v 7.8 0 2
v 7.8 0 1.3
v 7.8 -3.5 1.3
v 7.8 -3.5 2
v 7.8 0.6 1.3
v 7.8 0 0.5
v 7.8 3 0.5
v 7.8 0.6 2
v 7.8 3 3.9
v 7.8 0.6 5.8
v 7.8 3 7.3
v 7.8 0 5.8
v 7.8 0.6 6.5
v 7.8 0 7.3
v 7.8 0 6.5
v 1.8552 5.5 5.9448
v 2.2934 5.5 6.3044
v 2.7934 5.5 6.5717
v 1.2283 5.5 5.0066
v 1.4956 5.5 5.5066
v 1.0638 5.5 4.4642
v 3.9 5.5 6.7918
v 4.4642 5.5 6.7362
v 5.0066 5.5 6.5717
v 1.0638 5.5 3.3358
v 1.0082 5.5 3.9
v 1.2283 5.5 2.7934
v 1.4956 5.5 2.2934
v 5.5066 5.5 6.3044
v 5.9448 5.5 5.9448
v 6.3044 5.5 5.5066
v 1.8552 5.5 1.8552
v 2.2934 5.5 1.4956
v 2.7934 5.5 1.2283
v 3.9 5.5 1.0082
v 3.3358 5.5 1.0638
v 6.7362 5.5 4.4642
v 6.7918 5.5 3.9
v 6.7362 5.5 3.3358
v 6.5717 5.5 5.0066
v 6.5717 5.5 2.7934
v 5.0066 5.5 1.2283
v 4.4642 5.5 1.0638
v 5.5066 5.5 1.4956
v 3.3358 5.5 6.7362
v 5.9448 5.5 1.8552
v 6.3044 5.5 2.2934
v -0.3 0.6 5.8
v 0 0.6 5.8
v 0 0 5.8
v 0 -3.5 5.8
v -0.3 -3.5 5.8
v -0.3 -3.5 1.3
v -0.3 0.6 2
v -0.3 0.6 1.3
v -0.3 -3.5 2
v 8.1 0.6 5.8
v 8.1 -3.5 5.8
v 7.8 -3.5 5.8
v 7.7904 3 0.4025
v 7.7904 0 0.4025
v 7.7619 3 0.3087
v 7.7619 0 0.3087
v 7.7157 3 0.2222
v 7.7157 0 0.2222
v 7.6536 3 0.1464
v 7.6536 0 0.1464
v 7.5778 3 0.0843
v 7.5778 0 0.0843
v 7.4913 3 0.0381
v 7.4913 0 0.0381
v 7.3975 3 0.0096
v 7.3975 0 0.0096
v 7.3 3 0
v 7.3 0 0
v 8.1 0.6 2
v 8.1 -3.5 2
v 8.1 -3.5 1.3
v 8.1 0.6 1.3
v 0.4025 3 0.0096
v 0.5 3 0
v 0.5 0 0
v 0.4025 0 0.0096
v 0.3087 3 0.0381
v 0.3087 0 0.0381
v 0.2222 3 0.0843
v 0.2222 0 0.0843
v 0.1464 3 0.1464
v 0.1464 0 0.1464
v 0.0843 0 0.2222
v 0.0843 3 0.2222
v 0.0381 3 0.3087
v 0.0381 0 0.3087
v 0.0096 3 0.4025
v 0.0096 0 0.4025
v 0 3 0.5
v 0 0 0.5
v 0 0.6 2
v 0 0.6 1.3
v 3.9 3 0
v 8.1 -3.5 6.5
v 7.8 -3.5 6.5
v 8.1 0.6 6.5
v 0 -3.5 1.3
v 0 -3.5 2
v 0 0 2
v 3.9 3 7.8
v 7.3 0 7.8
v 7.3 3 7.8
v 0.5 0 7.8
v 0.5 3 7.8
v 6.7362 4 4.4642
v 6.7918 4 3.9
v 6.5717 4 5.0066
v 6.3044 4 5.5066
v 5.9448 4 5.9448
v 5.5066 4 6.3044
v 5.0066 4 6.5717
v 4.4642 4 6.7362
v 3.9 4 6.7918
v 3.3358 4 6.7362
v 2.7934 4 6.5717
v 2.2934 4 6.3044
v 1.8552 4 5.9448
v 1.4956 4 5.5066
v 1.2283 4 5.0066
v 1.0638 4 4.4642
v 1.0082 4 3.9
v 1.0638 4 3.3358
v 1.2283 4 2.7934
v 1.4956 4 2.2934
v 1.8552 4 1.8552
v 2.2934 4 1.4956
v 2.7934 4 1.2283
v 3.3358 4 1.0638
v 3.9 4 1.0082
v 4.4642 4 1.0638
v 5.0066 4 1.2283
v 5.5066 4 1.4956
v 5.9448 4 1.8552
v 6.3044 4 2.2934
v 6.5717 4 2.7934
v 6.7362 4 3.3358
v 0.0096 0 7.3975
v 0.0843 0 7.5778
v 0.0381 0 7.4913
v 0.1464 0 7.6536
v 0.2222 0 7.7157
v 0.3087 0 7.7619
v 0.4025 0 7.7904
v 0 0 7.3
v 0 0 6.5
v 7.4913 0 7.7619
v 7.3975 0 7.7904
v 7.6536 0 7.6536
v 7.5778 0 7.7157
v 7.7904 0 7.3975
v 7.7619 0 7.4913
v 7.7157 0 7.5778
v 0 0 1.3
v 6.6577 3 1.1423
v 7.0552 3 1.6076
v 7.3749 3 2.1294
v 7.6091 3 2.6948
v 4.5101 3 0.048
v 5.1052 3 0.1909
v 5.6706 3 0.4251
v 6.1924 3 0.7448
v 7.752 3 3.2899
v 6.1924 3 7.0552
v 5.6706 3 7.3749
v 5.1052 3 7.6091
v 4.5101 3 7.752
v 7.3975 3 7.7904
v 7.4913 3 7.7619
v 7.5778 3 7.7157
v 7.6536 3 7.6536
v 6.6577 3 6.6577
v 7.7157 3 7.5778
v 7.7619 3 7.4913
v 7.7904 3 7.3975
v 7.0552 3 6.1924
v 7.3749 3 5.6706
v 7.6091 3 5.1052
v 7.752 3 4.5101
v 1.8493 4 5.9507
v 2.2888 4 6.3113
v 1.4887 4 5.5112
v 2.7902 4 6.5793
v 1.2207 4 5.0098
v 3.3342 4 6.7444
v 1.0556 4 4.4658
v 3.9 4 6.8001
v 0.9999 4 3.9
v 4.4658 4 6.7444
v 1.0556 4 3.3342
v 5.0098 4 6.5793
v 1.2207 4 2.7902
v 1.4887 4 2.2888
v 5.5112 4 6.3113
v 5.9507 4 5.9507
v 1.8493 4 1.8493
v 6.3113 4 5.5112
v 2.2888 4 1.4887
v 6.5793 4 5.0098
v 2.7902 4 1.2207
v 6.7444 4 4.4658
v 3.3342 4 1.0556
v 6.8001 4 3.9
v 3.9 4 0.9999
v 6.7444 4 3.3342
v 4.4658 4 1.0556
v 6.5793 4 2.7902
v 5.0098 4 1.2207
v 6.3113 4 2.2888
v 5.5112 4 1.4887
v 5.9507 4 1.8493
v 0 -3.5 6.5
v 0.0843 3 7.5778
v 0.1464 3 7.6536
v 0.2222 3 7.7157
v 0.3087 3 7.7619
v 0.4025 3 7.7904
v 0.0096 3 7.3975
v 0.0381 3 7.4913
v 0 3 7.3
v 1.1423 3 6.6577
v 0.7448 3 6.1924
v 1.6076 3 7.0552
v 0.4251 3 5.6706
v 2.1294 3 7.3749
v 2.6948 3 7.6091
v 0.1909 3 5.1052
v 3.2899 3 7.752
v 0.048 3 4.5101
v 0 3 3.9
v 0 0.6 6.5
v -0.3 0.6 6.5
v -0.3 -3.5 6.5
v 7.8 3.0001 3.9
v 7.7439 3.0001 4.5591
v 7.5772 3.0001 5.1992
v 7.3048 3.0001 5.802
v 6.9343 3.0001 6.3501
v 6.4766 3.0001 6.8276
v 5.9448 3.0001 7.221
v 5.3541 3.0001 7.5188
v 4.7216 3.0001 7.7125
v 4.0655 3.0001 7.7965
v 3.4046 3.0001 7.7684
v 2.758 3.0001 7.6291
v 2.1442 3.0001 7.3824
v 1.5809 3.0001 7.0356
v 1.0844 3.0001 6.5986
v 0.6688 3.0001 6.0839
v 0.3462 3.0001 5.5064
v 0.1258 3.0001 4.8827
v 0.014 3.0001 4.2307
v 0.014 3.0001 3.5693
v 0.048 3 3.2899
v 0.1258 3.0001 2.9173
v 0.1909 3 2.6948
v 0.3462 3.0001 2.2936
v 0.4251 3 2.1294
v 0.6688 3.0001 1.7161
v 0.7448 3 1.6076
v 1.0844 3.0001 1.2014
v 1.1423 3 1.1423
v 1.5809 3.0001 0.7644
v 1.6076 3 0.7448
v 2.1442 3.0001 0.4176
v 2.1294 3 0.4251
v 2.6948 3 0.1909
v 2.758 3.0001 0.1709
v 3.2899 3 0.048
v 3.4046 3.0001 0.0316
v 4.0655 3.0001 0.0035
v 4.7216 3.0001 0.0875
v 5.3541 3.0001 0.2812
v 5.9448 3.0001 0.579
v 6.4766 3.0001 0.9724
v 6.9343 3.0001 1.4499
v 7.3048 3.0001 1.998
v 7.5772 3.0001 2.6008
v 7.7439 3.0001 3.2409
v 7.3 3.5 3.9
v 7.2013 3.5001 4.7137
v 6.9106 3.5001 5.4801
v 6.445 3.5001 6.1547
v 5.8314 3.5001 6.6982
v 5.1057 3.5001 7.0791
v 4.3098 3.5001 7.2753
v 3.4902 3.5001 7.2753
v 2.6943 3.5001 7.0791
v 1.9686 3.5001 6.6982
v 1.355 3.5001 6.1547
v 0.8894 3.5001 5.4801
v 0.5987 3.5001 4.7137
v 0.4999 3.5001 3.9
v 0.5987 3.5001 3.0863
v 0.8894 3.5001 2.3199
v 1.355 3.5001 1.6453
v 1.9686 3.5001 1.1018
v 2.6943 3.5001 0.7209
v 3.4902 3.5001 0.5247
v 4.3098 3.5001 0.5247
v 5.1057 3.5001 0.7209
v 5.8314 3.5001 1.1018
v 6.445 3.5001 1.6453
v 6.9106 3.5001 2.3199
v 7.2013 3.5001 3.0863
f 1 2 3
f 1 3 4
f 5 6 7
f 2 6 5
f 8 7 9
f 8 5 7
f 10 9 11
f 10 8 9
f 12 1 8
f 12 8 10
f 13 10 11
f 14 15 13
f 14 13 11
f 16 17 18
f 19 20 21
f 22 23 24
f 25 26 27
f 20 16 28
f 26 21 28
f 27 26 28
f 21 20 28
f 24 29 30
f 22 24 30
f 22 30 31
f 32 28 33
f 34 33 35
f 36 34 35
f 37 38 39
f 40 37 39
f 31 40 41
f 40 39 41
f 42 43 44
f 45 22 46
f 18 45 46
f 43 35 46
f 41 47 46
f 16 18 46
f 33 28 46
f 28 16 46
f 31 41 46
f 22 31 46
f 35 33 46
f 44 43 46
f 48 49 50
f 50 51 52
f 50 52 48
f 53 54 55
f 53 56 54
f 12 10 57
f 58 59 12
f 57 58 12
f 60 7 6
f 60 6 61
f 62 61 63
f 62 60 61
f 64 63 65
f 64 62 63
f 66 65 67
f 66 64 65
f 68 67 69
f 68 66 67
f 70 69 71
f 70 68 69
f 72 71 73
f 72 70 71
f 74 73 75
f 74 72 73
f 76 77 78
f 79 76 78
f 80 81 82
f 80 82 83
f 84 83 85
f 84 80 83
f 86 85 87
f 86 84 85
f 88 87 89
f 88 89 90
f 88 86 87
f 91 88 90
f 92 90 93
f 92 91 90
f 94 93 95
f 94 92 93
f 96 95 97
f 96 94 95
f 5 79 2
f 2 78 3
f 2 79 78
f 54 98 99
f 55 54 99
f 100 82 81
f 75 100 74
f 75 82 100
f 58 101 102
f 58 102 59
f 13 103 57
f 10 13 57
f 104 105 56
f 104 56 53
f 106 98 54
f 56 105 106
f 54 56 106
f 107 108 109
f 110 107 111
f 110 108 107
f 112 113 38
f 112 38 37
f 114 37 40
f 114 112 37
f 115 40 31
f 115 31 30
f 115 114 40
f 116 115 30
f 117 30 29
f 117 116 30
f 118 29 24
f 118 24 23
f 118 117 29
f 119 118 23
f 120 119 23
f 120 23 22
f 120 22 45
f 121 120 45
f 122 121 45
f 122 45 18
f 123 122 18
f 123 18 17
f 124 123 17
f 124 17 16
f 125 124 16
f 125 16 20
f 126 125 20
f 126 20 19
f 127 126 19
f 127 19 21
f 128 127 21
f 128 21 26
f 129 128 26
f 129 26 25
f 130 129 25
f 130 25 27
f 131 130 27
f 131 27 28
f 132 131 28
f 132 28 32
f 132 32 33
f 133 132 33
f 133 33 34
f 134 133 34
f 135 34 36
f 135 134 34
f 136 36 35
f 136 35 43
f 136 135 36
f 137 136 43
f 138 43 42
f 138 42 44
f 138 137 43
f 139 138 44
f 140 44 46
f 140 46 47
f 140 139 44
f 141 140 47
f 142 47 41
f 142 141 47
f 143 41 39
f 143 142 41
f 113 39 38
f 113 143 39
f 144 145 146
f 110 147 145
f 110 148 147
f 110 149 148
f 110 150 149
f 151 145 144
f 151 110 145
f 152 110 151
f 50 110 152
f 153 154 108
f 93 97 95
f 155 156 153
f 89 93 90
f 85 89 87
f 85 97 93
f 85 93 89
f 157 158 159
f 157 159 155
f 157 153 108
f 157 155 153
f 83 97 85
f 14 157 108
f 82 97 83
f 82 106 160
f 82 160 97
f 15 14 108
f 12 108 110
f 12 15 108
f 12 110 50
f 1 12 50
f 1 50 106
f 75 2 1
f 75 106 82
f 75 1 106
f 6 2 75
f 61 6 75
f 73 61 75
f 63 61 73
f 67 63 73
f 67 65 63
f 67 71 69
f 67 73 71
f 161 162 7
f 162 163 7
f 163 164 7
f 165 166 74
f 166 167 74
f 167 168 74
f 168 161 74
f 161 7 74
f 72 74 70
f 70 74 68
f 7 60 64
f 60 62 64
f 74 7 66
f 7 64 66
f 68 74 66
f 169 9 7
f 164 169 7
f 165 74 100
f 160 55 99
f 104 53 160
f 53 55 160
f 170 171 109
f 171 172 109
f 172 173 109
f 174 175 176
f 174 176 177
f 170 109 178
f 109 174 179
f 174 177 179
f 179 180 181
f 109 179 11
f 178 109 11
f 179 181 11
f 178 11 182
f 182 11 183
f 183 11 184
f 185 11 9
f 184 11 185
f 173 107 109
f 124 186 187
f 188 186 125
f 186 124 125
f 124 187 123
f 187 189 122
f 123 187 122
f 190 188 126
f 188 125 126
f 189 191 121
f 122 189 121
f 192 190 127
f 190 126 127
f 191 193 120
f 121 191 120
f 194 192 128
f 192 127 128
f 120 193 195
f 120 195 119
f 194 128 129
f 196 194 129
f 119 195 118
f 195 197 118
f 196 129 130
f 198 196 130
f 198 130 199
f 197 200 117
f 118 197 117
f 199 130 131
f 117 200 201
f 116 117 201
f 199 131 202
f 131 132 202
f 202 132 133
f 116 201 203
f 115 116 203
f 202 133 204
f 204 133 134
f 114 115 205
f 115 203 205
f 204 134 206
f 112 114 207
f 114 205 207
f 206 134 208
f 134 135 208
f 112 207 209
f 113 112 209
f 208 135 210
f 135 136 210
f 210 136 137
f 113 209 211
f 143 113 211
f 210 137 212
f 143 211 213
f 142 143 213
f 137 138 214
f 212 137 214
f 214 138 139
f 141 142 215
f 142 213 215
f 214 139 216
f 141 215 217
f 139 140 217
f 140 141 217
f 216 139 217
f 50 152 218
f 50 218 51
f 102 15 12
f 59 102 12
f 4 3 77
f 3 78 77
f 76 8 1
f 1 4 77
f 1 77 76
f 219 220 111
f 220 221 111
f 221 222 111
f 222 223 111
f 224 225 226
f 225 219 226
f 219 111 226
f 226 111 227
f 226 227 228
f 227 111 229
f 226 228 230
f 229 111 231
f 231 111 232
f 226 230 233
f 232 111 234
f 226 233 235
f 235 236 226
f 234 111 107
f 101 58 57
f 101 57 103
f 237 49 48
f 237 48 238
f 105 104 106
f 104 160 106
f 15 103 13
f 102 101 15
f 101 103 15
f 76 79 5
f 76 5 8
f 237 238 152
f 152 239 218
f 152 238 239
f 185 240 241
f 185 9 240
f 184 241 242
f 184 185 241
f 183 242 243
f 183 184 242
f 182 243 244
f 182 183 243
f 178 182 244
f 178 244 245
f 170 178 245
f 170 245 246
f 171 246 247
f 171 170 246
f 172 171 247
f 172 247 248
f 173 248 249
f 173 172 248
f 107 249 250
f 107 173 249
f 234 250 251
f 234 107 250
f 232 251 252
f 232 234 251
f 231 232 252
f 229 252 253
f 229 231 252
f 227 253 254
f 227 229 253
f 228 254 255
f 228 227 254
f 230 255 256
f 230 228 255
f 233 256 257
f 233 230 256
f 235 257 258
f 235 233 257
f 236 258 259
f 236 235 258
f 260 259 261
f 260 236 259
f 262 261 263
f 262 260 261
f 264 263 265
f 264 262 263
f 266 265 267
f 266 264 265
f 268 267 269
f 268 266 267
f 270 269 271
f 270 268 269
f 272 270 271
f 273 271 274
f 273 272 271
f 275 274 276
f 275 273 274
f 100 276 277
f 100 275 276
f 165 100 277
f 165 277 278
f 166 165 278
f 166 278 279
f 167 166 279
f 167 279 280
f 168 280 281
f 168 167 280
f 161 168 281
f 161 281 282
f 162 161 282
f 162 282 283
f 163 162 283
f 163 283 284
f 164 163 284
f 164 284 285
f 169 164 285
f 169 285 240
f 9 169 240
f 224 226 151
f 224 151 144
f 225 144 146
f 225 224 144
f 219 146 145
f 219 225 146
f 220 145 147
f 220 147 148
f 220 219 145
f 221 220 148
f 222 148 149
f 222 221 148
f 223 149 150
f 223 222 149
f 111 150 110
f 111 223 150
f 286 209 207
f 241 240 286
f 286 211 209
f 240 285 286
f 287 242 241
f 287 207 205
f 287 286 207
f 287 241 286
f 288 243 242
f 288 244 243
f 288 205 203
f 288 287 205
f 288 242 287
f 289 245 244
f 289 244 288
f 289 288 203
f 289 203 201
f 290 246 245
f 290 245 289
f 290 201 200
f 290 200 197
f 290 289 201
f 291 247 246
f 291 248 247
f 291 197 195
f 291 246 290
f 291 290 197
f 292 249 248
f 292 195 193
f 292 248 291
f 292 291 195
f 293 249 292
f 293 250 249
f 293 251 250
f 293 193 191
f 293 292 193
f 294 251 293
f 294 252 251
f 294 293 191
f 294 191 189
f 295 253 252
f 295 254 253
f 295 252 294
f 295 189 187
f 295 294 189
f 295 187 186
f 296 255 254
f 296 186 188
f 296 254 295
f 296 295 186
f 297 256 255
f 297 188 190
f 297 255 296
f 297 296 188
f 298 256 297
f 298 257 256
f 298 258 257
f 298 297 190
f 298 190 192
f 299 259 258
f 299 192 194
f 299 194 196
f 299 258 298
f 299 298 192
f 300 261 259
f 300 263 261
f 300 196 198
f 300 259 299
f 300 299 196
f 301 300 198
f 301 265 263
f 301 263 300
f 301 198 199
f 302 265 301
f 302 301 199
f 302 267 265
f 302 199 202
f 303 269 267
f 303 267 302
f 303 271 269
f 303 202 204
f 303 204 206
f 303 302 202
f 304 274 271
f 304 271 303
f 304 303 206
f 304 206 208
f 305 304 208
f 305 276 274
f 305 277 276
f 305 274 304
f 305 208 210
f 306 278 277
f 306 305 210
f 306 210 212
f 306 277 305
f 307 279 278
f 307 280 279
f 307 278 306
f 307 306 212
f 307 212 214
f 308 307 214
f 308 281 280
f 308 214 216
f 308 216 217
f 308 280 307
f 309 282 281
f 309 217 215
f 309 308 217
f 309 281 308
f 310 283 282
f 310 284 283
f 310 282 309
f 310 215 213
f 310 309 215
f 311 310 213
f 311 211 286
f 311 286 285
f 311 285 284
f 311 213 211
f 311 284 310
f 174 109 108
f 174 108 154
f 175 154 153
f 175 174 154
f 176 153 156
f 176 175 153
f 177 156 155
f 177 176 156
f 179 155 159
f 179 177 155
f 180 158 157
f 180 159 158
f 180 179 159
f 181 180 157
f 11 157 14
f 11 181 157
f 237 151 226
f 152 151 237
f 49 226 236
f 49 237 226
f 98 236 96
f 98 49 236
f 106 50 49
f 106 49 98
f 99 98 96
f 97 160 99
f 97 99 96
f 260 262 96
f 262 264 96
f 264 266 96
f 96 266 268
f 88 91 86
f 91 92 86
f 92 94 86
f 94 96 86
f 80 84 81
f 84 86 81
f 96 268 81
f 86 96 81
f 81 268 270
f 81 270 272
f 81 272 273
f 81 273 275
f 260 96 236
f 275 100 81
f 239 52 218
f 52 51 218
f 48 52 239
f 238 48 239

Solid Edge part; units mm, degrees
sketch "Sketch1" plane through (0, 0, 0) normal (0, -1, 0) x (1, 0, 0)
  line L0 (0, 0) -> (7.8, 0)
  line L1 (7.8, 0) -> (7.8, 7.8)
  line L2 (7.8, 7.8) -> (0, 7.8)
  line L3 (0, 7.8) -> (0, 0)
extrude "Protrusion1" add sketch "Sketch1" against normal blind 3
sketch "Sketch2" plane through (0, 0, 0) normal (0, -1, 0) x (1, 0, 0)
  circle A0 centre (3.9, 3.9) radius 3.9
extrude "Ajout_matière_3" add sketch "Sketch2" against normal blind 4
sketch "Sketch3" plane through (0, 0, 0) normal (0, -1, 0) x (1, 0, 0)
  circle A0 centre (3.9, 3.9) radius 2.8918
extrude "Ajout_matière_4" add sketch "Sketch3" against normal blind 5.5
chamfer "Chanfrein_1" distance 1 angle 45 1 edges at (0, 4, 3.9)
fillet "Congé_1" radius 0.5 4 edges at (7.8, 1.5, 7.8) (7.8, 1.5, 0) (0, 1.5, 0) (0, 1.5, 7.8)
sketch "Sketch4" plane through (3.9, 0, 3.9) normal (0, -1, 0) x (-1, 0, 0)
  line L0 (4.2, 1.9) -> (4.2, 2.6)
  line L1 (4.2, 2.6) -> (3.9, 2.6)
  line L2 (3.9, 2.6) -> (3.9, 1.9)
  line L3 (3.9, 1.9) -> (4.2, 1.9)
  line L4 (-4.2, 1.9) -> (-4.2, 2.6)
  line L5 (-4.2, 2.6) -> (-3.9, 2.6)
  line L6 (-3.9, 2.6) -> (-3.9, 1.9)
  line L7 (-3.9, 1.9) -> (-4.2, 1.9)
  line L8 (-4.2, -1.9) -> (-4.2, -2.6)
  line L9 (-4.2, -2.6) -> (-3.9, -2.6)
  line L10 (-3.9, -2.6) -> (-3.9, -1.9)
  line L11 (-3.9, -1.9) -> (-4.2, -1.9)
  line L12 (4.2, -1.9) -> (4.2, -2.6)
  line L13 (4.2, -2.6) -> (3.9, -2.6)
  line L14 (3.9, -2.6) -> (3.9, -1.9)
  line L15 (3.9, -1.9) -> (4.2, -1.9)
  dimension "D1" = 0.3
  dimension "D2" = 0.7
  dimension "D3" = 0.7
  dimension "D4" = 0.7
  dimension "D5" = 0.3
  dimension "D6" = 3.8
  dimension "D7" = 1.9
  dimension "D8" = 1.9
  dimension "D9" = 1.9
  dimension "D10" = 1.9
extrude "Ajout_matière_5" add sketch "Sketch4" against normal blind 0.6
sketch "Sketch5" plane through (3.9, 0, 3.9) normal (0, -1, 0) x (-1, 0, 0)
  line L0 (-4.2, 1.9) -> (-4.2, 2.6)
  line L1 (-4.2, 2.6) -> (-3.9, 2.6)
  line L2 (-3.9, 2.6) -> (-3.9, 1.9)
  line L3 (-3.9, 1.9) -> (-4.2, 1.9)
  line L4 (-4.2, -1.9) -> (-4.2, -2.6)
  line L5 (-4.2, -2.6) -> (-3.9, -2.6)
  line L6 (-3.9, -2.6) -> (-3.9, -1.9)
  line L7 (-3.9, -1.9) -> (-4.2, -1.9)
  line L8 (3.9, -2.6) -> (3.9, -1.9)
  line L9 (3.9, -1.9) -> (4.2, -1.9)
  line L10 (4.2, -1.9) -> (4.2, -2.6)
  line L11 (4.2, -2.6) -> (3.9, -2.6)
  line L12 (4.2, 1.9) -> (4.2, 2.6)
  line L13 (4.2, 2.6) -> (3.9, 2.6)
  line L14 (3.9, 2.6) -> (3.9, 1.9)
  line L15 (3.9, 1.9) -> (4.2, 1.9)
  dimension "D1" = 0.3
  dimension "D2" = 0.7
  dimension "D3" = 0.7
  dimension "D4" = 0.7
  dimension "D5" = 0.3
  dimension "D6" = 3.8
  dimension "D7" = 1.9
  dimension "D8" = 1.9
  dimension "D9" = 1.9
  dimension "D10" = 1.9
extrude "Ajout_matière_6" add sketch "Sketch5" along normal blind 3.5
